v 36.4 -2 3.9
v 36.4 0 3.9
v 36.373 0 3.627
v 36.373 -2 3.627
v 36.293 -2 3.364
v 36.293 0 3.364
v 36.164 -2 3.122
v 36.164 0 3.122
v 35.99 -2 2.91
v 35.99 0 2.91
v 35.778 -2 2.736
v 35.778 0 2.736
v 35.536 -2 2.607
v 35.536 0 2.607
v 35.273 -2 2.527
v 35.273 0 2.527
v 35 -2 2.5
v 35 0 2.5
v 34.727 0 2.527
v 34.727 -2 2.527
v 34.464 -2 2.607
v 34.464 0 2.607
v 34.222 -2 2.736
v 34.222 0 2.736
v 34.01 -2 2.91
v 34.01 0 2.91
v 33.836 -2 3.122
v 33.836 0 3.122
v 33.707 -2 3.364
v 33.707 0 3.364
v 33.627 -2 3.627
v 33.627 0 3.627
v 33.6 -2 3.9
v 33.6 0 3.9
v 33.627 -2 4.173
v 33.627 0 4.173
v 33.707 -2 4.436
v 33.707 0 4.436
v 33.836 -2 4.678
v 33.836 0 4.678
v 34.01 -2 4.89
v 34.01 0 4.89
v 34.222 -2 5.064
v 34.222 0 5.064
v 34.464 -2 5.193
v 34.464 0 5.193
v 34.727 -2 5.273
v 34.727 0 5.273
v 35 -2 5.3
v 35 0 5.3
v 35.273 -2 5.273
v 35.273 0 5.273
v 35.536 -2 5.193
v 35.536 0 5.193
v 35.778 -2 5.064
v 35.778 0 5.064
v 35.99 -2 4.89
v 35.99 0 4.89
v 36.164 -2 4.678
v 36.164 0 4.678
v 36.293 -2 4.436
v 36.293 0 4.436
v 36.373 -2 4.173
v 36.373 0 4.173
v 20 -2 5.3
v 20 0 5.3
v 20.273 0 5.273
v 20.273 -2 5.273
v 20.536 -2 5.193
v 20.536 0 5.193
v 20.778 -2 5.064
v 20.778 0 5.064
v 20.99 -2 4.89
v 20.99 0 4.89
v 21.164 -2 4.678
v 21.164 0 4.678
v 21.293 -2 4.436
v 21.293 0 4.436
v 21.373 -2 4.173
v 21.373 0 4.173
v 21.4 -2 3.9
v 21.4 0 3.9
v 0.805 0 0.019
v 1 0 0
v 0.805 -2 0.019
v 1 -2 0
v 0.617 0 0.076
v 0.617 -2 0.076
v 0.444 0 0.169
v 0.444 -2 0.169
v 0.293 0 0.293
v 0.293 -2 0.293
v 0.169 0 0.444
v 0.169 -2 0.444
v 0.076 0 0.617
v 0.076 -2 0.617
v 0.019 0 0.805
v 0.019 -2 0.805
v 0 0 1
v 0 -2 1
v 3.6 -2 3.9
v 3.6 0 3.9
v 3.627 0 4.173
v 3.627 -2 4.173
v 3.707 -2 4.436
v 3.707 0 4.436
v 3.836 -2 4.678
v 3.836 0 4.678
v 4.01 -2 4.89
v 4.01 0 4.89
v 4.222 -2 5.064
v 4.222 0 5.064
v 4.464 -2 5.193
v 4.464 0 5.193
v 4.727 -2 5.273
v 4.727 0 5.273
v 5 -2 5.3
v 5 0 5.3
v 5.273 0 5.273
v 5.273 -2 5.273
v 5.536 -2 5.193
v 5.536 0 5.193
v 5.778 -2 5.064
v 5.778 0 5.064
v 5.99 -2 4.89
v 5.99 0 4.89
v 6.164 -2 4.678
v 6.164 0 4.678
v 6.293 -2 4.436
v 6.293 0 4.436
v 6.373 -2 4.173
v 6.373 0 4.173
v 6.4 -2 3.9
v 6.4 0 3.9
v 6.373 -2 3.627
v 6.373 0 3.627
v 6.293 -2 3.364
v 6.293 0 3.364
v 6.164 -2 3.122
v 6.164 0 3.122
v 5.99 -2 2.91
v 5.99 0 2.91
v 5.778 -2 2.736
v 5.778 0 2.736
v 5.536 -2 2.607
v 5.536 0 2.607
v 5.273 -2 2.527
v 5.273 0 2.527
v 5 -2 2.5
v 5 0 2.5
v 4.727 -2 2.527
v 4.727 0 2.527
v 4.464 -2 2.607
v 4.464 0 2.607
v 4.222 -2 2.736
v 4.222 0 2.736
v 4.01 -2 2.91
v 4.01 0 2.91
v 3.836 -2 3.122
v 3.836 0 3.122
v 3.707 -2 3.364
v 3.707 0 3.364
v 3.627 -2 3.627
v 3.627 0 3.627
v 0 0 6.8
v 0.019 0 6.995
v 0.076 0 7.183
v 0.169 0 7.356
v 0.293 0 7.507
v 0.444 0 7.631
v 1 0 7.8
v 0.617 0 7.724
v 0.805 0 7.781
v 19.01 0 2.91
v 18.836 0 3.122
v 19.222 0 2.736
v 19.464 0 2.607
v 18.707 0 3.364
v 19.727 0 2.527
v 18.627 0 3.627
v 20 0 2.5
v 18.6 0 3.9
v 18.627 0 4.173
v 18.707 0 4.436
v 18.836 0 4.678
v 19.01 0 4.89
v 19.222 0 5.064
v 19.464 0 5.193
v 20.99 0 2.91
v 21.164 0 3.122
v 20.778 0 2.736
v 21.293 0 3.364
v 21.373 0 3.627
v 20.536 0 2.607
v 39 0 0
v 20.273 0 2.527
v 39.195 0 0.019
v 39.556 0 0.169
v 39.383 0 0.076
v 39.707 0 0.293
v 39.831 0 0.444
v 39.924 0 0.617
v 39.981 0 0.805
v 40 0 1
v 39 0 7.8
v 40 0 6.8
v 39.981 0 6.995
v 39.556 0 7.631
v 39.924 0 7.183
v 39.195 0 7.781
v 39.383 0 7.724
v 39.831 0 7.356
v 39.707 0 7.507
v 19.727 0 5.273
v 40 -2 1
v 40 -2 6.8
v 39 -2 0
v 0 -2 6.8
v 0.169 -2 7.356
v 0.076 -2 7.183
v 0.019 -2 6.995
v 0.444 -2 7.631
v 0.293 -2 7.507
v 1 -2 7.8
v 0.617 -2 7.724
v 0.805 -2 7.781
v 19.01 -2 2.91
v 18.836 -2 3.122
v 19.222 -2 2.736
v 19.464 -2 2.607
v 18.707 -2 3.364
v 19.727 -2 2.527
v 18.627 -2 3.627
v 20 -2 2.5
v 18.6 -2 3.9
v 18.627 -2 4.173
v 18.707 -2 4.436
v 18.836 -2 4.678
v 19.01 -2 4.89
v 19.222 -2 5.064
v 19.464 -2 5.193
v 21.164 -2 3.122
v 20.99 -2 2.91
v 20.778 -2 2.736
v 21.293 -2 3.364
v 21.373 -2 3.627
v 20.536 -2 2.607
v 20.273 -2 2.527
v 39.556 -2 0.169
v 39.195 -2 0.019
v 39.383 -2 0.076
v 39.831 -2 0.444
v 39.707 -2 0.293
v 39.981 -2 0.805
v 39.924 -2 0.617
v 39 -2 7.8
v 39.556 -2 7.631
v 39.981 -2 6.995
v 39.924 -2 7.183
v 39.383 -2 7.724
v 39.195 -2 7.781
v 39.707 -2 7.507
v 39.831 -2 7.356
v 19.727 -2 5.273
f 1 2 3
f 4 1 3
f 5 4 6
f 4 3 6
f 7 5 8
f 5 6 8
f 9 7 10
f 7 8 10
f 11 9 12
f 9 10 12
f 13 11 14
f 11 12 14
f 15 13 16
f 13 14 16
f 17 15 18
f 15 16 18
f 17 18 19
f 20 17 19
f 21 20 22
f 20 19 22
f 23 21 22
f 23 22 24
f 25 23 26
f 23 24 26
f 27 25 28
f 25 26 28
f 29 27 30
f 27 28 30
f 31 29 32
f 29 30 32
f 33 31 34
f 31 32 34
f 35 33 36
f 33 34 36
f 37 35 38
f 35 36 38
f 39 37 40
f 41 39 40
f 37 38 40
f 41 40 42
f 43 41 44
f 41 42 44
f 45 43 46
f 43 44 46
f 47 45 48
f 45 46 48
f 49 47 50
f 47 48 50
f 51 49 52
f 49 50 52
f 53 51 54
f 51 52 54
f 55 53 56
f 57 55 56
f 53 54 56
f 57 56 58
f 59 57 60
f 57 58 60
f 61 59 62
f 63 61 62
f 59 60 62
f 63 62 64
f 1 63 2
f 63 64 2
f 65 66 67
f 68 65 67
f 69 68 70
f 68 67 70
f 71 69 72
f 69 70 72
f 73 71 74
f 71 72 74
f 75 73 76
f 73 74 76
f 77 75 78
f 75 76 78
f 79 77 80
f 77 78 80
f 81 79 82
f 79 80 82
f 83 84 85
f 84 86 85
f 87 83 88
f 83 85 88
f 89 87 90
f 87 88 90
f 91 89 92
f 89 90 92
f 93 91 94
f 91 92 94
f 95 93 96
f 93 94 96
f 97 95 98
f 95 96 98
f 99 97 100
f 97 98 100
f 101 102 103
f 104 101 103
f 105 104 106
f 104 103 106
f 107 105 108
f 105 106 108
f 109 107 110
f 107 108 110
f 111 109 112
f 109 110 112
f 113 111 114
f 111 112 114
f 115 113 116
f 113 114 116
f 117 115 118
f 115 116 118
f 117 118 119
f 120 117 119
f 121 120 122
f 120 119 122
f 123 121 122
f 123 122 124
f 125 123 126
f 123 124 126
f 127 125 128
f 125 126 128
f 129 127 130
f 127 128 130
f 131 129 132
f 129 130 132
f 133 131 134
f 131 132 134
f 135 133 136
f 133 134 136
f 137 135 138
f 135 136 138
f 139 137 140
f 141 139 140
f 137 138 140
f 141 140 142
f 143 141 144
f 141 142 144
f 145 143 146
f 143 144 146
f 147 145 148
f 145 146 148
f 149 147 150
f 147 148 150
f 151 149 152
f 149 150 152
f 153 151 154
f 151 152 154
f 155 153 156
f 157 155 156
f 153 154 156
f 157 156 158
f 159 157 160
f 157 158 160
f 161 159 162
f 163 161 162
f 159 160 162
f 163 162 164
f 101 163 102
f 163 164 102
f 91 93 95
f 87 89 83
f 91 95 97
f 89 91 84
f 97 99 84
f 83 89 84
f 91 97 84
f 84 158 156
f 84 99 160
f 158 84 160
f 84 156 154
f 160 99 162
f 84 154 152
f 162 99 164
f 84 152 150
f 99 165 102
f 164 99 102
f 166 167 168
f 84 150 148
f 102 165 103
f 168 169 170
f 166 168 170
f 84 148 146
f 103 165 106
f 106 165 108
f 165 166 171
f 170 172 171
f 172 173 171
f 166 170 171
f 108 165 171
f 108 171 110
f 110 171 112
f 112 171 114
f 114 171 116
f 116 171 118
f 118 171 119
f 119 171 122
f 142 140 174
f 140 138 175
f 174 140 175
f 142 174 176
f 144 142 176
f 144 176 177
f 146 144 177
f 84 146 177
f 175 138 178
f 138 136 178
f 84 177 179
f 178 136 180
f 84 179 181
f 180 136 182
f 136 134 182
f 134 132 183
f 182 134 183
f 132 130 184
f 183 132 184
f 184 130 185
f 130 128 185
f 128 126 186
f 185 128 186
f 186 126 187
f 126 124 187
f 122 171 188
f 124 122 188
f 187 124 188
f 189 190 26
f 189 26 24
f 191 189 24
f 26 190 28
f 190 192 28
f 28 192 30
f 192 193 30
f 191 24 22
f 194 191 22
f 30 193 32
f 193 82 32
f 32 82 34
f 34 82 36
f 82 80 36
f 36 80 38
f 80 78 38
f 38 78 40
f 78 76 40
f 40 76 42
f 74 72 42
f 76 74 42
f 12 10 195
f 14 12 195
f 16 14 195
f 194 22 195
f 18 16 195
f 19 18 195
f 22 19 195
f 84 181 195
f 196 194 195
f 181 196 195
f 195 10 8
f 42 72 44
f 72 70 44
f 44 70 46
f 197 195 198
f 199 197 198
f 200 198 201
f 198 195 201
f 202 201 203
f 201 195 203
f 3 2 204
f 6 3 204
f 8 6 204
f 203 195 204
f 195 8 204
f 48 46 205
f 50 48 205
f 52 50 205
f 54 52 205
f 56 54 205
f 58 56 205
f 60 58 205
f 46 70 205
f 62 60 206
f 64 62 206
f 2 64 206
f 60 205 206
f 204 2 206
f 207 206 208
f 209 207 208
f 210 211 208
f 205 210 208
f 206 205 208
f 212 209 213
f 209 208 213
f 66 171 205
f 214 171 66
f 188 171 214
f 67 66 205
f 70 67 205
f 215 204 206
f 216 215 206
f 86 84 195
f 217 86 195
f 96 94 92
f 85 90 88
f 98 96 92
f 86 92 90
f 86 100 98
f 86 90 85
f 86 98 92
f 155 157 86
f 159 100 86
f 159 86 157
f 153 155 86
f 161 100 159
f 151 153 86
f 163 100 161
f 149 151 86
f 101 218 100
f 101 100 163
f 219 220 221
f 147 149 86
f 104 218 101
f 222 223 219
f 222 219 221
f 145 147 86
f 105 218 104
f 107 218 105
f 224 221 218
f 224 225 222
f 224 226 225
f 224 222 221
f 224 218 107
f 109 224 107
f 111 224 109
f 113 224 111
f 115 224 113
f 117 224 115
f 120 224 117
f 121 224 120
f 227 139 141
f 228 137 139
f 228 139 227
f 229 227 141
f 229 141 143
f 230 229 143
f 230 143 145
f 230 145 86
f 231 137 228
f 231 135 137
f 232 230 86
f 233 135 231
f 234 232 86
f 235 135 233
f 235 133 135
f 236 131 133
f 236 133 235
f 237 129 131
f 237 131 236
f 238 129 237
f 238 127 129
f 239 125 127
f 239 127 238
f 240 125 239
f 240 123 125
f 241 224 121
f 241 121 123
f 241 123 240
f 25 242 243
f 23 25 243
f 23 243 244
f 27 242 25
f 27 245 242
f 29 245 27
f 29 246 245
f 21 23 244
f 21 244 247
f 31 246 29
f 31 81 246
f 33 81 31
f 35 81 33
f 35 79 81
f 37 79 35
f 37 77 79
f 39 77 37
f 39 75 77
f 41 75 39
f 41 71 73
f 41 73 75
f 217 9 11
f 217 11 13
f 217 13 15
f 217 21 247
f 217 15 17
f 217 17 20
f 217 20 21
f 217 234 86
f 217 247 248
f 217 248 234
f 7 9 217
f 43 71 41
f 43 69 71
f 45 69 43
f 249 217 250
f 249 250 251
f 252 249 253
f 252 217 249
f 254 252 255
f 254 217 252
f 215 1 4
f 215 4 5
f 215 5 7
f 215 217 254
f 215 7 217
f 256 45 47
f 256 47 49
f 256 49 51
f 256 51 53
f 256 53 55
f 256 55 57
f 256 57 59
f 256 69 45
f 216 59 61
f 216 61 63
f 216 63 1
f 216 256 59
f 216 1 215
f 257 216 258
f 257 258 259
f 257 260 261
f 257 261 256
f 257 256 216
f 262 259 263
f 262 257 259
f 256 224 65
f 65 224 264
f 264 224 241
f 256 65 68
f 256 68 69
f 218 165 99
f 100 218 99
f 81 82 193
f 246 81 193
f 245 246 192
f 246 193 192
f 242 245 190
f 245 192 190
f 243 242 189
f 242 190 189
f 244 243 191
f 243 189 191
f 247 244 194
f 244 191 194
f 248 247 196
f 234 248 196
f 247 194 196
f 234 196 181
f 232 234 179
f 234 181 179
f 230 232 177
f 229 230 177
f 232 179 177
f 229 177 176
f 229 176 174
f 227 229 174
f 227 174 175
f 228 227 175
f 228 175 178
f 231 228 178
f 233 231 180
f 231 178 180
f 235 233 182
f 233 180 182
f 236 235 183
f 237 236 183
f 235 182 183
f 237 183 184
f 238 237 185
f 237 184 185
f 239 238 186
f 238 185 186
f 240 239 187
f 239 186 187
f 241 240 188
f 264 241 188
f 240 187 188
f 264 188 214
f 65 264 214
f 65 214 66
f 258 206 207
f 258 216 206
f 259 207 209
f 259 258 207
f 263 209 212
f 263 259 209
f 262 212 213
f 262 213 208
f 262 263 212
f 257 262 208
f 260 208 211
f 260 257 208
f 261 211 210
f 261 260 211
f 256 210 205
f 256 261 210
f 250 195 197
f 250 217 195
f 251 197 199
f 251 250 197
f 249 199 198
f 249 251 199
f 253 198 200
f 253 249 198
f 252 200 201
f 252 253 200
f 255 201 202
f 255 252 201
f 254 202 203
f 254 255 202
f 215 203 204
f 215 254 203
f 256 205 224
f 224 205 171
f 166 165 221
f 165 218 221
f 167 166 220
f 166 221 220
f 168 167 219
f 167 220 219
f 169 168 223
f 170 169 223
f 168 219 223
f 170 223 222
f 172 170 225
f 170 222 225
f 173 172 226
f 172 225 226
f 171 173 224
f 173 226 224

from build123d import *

# Parameters (mm, degrees)
F1_DEPTH = 2
F2_R     = 1


with BuildPart() as f1:
    # F0 (on Front) → F1 (new body)
    with BuildSketch(Plane.XZ):
        with BuildLine():
            ThreePointArc((21.4, 3.9), (20.989949, 4.889949), (20, 5.3))
            ThreePointArc((20, 5.3), (19.010051, 2.910051), (21.4, 3.9))
        make_face()
        Polygon((0, 3.9), (0, 0), (40, 0), (40, 3.9), (40, 7.8), (20, 7.8), (0, 7.8), align=None)
        with BuildLine():
            ThreePointArc((6.4, 3.9), (5, 2.5), (3.6, 3.9))
            ThreePointArc((3.6, 3.9), (5, 5.3), (6.4, 3.9))
        make_face(mode=Mode.SUBTRACT)
        with BuildLine():
            ThreePointArc((21.4, 3.9), (19.010051, 2.910051), (20, 5.3))
            ThreePointArc((20, 5.3), (20.989949, 4.889949), (21.4, 3.9))
        make_face(mode=Mode.SUBTRACT)
        with BuildLine():
            ThreePointArc((33.6, 3.9), (35, 5.3), (36.4, 3.9))
            ThreePointArc((36.4, 3.9), (35, 2.5), (33.6, 3.9))
        make_face(mode=Mode.SUBTRACT)
    extrude(amount=F1_DEPTH)

    # F2
    f2_edges = [f1.edges().sort_by_distance(p)[0] for p in [
        (0, -1, 7.8),
        (0, -1, 0),
        (40, -1, 7.8),
        (40, -1, 0),
    ]]
    fillet(f2_edges, radius=F2_R)


solid = f1.part
